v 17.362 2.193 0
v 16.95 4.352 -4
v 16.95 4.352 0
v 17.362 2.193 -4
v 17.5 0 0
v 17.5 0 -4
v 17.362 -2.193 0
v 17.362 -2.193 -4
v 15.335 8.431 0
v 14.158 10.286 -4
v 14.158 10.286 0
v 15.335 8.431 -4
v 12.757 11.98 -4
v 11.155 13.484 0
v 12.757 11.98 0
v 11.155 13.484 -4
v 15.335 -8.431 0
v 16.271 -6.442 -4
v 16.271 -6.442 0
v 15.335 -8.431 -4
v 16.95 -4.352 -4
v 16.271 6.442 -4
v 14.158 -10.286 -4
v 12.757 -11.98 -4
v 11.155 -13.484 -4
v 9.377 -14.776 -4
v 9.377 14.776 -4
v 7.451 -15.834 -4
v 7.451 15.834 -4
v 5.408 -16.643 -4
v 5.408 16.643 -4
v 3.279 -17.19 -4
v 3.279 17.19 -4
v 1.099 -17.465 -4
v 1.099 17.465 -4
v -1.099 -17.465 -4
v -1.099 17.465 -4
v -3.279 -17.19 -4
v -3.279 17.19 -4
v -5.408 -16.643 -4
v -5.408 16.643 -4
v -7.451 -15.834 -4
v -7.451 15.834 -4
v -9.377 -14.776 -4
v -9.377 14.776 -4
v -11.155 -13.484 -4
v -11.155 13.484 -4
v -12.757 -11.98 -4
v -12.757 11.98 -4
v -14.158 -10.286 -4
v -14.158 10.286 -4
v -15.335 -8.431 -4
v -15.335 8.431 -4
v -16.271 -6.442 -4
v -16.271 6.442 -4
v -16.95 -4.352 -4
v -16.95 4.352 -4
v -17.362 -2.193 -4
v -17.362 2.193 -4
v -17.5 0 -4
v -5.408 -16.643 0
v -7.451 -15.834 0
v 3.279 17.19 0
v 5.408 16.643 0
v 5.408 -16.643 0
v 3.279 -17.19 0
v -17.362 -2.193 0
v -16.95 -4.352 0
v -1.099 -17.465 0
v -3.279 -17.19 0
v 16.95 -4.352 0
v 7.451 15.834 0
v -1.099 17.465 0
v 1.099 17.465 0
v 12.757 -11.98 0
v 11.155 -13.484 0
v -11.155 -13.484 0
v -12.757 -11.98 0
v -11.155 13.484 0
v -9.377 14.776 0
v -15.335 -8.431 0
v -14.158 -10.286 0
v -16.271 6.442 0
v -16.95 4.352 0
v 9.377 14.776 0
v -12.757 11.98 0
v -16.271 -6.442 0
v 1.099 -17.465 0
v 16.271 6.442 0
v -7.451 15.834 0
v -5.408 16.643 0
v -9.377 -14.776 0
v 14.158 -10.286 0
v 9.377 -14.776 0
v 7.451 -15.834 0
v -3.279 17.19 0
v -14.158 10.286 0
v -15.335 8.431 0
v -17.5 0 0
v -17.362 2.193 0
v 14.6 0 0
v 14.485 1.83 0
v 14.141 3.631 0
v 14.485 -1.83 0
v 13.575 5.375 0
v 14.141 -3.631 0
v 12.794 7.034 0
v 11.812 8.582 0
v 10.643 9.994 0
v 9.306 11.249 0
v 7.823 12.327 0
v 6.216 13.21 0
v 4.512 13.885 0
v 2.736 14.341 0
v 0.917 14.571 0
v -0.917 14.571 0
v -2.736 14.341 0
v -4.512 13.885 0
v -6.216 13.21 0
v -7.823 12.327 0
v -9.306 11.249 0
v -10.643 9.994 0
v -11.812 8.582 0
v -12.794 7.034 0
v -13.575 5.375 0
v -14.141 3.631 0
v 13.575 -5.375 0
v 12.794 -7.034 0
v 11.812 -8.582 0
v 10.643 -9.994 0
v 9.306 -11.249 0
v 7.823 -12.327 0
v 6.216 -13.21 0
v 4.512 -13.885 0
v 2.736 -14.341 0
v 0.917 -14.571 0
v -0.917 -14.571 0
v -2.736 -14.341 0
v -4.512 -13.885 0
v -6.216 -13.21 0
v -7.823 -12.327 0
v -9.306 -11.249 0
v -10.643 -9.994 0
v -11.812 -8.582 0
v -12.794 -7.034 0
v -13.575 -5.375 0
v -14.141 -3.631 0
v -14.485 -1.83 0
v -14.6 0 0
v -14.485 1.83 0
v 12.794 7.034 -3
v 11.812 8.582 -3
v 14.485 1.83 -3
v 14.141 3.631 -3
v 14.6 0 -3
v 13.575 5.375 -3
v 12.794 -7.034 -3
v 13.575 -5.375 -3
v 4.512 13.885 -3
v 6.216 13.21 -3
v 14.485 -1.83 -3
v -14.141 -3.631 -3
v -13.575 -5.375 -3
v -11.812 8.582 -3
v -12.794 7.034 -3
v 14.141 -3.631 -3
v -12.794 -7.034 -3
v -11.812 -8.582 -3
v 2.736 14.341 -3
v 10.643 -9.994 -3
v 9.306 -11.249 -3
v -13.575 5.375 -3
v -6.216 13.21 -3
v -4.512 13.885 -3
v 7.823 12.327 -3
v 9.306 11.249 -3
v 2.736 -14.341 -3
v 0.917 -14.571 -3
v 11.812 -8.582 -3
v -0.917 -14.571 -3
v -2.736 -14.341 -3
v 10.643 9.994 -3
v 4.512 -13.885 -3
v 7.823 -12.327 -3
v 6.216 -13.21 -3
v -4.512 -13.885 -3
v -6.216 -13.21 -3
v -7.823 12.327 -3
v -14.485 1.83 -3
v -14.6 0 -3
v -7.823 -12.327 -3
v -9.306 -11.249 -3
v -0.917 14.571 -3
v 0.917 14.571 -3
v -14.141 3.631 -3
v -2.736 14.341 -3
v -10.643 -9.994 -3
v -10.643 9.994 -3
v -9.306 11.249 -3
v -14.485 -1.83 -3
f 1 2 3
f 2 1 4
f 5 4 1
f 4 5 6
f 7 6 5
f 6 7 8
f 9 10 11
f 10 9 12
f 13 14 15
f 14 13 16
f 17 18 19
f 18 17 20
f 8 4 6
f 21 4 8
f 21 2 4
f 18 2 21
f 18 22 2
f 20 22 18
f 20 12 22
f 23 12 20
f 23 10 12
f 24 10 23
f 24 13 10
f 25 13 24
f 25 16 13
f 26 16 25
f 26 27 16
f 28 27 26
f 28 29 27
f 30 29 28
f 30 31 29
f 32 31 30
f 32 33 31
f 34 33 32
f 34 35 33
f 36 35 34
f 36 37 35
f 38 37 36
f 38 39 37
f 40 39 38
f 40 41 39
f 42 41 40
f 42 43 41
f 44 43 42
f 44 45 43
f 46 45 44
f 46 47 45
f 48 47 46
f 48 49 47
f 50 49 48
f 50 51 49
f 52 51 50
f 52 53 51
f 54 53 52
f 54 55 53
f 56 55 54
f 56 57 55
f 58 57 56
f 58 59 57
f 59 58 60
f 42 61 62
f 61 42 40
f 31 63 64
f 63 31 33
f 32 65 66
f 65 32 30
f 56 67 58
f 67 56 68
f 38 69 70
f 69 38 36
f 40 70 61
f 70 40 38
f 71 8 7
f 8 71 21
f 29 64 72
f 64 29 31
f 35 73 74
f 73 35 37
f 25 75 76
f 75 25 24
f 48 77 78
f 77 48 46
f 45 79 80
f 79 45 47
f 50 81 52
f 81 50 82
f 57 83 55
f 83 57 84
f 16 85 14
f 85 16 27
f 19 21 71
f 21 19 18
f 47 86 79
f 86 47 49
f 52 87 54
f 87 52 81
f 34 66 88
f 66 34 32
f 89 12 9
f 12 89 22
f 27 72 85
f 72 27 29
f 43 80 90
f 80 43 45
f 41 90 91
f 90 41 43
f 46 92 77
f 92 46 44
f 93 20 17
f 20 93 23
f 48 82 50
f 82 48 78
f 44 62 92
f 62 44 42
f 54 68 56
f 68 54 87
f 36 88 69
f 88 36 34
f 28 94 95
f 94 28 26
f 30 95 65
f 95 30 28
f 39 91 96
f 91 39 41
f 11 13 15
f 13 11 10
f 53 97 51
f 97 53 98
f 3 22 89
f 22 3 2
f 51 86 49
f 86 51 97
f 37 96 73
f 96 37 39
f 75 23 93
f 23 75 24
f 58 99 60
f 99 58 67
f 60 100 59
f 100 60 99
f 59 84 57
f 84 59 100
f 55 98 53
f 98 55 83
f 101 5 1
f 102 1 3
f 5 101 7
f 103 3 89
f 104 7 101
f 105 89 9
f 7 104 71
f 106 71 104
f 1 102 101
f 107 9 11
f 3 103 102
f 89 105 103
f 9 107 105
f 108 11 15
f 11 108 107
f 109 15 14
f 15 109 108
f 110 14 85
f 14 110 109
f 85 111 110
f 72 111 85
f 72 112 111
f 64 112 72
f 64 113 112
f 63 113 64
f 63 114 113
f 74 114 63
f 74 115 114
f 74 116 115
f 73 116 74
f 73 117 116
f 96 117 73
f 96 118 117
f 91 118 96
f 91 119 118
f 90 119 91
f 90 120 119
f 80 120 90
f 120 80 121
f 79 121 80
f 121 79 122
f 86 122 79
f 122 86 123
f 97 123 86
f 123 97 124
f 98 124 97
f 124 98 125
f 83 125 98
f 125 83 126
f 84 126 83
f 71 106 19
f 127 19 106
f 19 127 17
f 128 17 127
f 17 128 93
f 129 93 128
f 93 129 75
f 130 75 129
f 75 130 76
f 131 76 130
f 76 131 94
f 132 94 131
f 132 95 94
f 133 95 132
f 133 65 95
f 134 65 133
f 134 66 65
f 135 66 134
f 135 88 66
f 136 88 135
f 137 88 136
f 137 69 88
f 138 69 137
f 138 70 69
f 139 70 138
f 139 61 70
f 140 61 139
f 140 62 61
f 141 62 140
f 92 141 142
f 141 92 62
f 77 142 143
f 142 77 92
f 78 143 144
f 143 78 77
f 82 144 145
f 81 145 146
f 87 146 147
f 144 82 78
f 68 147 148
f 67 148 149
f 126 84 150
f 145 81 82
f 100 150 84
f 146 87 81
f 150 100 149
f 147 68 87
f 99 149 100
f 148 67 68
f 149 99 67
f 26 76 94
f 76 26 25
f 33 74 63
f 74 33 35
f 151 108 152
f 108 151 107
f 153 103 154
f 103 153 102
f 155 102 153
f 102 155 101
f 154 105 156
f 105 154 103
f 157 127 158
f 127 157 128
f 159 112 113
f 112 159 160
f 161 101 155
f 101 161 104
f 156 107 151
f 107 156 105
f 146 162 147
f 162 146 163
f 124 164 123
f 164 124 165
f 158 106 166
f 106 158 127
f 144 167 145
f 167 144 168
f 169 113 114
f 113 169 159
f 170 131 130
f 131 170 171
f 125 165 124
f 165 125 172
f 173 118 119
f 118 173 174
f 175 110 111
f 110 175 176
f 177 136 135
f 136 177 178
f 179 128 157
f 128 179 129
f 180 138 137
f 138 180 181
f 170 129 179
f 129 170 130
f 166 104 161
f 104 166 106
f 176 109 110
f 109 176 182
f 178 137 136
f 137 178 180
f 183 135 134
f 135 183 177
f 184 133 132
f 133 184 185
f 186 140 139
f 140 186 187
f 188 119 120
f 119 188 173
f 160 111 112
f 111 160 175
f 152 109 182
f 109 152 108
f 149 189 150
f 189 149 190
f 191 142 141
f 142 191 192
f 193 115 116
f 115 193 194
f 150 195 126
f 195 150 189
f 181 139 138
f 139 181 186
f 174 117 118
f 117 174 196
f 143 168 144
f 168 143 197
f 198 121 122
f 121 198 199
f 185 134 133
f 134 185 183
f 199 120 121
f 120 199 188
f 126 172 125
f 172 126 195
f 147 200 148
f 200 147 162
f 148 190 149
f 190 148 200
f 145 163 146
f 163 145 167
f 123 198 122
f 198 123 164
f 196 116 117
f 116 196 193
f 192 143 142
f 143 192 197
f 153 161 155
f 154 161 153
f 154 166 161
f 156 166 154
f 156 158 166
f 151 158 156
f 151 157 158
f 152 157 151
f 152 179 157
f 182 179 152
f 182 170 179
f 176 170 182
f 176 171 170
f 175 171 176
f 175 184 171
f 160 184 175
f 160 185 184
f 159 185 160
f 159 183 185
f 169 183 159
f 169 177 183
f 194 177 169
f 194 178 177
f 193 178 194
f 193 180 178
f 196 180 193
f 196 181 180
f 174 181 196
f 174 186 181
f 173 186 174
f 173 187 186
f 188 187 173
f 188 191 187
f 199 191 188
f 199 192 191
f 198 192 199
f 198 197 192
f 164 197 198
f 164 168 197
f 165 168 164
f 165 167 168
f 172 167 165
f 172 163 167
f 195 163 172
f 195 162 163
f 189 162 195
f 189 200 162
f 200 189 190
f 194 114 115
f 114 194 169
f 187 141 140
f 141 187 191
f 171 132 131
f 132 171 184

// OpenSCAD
$fn = 50;


difference() {
	union() {
		translate(v = [0, 0, -4.0000000000]) {
			cylinder(h = 4, r = 17.5000000000);
		}
	}
	union() {
		#translate(v = [0, 0, -3.0000000000]) {
			cylinder(h = 3, r = 14.6000000000);
		}
	}
}
